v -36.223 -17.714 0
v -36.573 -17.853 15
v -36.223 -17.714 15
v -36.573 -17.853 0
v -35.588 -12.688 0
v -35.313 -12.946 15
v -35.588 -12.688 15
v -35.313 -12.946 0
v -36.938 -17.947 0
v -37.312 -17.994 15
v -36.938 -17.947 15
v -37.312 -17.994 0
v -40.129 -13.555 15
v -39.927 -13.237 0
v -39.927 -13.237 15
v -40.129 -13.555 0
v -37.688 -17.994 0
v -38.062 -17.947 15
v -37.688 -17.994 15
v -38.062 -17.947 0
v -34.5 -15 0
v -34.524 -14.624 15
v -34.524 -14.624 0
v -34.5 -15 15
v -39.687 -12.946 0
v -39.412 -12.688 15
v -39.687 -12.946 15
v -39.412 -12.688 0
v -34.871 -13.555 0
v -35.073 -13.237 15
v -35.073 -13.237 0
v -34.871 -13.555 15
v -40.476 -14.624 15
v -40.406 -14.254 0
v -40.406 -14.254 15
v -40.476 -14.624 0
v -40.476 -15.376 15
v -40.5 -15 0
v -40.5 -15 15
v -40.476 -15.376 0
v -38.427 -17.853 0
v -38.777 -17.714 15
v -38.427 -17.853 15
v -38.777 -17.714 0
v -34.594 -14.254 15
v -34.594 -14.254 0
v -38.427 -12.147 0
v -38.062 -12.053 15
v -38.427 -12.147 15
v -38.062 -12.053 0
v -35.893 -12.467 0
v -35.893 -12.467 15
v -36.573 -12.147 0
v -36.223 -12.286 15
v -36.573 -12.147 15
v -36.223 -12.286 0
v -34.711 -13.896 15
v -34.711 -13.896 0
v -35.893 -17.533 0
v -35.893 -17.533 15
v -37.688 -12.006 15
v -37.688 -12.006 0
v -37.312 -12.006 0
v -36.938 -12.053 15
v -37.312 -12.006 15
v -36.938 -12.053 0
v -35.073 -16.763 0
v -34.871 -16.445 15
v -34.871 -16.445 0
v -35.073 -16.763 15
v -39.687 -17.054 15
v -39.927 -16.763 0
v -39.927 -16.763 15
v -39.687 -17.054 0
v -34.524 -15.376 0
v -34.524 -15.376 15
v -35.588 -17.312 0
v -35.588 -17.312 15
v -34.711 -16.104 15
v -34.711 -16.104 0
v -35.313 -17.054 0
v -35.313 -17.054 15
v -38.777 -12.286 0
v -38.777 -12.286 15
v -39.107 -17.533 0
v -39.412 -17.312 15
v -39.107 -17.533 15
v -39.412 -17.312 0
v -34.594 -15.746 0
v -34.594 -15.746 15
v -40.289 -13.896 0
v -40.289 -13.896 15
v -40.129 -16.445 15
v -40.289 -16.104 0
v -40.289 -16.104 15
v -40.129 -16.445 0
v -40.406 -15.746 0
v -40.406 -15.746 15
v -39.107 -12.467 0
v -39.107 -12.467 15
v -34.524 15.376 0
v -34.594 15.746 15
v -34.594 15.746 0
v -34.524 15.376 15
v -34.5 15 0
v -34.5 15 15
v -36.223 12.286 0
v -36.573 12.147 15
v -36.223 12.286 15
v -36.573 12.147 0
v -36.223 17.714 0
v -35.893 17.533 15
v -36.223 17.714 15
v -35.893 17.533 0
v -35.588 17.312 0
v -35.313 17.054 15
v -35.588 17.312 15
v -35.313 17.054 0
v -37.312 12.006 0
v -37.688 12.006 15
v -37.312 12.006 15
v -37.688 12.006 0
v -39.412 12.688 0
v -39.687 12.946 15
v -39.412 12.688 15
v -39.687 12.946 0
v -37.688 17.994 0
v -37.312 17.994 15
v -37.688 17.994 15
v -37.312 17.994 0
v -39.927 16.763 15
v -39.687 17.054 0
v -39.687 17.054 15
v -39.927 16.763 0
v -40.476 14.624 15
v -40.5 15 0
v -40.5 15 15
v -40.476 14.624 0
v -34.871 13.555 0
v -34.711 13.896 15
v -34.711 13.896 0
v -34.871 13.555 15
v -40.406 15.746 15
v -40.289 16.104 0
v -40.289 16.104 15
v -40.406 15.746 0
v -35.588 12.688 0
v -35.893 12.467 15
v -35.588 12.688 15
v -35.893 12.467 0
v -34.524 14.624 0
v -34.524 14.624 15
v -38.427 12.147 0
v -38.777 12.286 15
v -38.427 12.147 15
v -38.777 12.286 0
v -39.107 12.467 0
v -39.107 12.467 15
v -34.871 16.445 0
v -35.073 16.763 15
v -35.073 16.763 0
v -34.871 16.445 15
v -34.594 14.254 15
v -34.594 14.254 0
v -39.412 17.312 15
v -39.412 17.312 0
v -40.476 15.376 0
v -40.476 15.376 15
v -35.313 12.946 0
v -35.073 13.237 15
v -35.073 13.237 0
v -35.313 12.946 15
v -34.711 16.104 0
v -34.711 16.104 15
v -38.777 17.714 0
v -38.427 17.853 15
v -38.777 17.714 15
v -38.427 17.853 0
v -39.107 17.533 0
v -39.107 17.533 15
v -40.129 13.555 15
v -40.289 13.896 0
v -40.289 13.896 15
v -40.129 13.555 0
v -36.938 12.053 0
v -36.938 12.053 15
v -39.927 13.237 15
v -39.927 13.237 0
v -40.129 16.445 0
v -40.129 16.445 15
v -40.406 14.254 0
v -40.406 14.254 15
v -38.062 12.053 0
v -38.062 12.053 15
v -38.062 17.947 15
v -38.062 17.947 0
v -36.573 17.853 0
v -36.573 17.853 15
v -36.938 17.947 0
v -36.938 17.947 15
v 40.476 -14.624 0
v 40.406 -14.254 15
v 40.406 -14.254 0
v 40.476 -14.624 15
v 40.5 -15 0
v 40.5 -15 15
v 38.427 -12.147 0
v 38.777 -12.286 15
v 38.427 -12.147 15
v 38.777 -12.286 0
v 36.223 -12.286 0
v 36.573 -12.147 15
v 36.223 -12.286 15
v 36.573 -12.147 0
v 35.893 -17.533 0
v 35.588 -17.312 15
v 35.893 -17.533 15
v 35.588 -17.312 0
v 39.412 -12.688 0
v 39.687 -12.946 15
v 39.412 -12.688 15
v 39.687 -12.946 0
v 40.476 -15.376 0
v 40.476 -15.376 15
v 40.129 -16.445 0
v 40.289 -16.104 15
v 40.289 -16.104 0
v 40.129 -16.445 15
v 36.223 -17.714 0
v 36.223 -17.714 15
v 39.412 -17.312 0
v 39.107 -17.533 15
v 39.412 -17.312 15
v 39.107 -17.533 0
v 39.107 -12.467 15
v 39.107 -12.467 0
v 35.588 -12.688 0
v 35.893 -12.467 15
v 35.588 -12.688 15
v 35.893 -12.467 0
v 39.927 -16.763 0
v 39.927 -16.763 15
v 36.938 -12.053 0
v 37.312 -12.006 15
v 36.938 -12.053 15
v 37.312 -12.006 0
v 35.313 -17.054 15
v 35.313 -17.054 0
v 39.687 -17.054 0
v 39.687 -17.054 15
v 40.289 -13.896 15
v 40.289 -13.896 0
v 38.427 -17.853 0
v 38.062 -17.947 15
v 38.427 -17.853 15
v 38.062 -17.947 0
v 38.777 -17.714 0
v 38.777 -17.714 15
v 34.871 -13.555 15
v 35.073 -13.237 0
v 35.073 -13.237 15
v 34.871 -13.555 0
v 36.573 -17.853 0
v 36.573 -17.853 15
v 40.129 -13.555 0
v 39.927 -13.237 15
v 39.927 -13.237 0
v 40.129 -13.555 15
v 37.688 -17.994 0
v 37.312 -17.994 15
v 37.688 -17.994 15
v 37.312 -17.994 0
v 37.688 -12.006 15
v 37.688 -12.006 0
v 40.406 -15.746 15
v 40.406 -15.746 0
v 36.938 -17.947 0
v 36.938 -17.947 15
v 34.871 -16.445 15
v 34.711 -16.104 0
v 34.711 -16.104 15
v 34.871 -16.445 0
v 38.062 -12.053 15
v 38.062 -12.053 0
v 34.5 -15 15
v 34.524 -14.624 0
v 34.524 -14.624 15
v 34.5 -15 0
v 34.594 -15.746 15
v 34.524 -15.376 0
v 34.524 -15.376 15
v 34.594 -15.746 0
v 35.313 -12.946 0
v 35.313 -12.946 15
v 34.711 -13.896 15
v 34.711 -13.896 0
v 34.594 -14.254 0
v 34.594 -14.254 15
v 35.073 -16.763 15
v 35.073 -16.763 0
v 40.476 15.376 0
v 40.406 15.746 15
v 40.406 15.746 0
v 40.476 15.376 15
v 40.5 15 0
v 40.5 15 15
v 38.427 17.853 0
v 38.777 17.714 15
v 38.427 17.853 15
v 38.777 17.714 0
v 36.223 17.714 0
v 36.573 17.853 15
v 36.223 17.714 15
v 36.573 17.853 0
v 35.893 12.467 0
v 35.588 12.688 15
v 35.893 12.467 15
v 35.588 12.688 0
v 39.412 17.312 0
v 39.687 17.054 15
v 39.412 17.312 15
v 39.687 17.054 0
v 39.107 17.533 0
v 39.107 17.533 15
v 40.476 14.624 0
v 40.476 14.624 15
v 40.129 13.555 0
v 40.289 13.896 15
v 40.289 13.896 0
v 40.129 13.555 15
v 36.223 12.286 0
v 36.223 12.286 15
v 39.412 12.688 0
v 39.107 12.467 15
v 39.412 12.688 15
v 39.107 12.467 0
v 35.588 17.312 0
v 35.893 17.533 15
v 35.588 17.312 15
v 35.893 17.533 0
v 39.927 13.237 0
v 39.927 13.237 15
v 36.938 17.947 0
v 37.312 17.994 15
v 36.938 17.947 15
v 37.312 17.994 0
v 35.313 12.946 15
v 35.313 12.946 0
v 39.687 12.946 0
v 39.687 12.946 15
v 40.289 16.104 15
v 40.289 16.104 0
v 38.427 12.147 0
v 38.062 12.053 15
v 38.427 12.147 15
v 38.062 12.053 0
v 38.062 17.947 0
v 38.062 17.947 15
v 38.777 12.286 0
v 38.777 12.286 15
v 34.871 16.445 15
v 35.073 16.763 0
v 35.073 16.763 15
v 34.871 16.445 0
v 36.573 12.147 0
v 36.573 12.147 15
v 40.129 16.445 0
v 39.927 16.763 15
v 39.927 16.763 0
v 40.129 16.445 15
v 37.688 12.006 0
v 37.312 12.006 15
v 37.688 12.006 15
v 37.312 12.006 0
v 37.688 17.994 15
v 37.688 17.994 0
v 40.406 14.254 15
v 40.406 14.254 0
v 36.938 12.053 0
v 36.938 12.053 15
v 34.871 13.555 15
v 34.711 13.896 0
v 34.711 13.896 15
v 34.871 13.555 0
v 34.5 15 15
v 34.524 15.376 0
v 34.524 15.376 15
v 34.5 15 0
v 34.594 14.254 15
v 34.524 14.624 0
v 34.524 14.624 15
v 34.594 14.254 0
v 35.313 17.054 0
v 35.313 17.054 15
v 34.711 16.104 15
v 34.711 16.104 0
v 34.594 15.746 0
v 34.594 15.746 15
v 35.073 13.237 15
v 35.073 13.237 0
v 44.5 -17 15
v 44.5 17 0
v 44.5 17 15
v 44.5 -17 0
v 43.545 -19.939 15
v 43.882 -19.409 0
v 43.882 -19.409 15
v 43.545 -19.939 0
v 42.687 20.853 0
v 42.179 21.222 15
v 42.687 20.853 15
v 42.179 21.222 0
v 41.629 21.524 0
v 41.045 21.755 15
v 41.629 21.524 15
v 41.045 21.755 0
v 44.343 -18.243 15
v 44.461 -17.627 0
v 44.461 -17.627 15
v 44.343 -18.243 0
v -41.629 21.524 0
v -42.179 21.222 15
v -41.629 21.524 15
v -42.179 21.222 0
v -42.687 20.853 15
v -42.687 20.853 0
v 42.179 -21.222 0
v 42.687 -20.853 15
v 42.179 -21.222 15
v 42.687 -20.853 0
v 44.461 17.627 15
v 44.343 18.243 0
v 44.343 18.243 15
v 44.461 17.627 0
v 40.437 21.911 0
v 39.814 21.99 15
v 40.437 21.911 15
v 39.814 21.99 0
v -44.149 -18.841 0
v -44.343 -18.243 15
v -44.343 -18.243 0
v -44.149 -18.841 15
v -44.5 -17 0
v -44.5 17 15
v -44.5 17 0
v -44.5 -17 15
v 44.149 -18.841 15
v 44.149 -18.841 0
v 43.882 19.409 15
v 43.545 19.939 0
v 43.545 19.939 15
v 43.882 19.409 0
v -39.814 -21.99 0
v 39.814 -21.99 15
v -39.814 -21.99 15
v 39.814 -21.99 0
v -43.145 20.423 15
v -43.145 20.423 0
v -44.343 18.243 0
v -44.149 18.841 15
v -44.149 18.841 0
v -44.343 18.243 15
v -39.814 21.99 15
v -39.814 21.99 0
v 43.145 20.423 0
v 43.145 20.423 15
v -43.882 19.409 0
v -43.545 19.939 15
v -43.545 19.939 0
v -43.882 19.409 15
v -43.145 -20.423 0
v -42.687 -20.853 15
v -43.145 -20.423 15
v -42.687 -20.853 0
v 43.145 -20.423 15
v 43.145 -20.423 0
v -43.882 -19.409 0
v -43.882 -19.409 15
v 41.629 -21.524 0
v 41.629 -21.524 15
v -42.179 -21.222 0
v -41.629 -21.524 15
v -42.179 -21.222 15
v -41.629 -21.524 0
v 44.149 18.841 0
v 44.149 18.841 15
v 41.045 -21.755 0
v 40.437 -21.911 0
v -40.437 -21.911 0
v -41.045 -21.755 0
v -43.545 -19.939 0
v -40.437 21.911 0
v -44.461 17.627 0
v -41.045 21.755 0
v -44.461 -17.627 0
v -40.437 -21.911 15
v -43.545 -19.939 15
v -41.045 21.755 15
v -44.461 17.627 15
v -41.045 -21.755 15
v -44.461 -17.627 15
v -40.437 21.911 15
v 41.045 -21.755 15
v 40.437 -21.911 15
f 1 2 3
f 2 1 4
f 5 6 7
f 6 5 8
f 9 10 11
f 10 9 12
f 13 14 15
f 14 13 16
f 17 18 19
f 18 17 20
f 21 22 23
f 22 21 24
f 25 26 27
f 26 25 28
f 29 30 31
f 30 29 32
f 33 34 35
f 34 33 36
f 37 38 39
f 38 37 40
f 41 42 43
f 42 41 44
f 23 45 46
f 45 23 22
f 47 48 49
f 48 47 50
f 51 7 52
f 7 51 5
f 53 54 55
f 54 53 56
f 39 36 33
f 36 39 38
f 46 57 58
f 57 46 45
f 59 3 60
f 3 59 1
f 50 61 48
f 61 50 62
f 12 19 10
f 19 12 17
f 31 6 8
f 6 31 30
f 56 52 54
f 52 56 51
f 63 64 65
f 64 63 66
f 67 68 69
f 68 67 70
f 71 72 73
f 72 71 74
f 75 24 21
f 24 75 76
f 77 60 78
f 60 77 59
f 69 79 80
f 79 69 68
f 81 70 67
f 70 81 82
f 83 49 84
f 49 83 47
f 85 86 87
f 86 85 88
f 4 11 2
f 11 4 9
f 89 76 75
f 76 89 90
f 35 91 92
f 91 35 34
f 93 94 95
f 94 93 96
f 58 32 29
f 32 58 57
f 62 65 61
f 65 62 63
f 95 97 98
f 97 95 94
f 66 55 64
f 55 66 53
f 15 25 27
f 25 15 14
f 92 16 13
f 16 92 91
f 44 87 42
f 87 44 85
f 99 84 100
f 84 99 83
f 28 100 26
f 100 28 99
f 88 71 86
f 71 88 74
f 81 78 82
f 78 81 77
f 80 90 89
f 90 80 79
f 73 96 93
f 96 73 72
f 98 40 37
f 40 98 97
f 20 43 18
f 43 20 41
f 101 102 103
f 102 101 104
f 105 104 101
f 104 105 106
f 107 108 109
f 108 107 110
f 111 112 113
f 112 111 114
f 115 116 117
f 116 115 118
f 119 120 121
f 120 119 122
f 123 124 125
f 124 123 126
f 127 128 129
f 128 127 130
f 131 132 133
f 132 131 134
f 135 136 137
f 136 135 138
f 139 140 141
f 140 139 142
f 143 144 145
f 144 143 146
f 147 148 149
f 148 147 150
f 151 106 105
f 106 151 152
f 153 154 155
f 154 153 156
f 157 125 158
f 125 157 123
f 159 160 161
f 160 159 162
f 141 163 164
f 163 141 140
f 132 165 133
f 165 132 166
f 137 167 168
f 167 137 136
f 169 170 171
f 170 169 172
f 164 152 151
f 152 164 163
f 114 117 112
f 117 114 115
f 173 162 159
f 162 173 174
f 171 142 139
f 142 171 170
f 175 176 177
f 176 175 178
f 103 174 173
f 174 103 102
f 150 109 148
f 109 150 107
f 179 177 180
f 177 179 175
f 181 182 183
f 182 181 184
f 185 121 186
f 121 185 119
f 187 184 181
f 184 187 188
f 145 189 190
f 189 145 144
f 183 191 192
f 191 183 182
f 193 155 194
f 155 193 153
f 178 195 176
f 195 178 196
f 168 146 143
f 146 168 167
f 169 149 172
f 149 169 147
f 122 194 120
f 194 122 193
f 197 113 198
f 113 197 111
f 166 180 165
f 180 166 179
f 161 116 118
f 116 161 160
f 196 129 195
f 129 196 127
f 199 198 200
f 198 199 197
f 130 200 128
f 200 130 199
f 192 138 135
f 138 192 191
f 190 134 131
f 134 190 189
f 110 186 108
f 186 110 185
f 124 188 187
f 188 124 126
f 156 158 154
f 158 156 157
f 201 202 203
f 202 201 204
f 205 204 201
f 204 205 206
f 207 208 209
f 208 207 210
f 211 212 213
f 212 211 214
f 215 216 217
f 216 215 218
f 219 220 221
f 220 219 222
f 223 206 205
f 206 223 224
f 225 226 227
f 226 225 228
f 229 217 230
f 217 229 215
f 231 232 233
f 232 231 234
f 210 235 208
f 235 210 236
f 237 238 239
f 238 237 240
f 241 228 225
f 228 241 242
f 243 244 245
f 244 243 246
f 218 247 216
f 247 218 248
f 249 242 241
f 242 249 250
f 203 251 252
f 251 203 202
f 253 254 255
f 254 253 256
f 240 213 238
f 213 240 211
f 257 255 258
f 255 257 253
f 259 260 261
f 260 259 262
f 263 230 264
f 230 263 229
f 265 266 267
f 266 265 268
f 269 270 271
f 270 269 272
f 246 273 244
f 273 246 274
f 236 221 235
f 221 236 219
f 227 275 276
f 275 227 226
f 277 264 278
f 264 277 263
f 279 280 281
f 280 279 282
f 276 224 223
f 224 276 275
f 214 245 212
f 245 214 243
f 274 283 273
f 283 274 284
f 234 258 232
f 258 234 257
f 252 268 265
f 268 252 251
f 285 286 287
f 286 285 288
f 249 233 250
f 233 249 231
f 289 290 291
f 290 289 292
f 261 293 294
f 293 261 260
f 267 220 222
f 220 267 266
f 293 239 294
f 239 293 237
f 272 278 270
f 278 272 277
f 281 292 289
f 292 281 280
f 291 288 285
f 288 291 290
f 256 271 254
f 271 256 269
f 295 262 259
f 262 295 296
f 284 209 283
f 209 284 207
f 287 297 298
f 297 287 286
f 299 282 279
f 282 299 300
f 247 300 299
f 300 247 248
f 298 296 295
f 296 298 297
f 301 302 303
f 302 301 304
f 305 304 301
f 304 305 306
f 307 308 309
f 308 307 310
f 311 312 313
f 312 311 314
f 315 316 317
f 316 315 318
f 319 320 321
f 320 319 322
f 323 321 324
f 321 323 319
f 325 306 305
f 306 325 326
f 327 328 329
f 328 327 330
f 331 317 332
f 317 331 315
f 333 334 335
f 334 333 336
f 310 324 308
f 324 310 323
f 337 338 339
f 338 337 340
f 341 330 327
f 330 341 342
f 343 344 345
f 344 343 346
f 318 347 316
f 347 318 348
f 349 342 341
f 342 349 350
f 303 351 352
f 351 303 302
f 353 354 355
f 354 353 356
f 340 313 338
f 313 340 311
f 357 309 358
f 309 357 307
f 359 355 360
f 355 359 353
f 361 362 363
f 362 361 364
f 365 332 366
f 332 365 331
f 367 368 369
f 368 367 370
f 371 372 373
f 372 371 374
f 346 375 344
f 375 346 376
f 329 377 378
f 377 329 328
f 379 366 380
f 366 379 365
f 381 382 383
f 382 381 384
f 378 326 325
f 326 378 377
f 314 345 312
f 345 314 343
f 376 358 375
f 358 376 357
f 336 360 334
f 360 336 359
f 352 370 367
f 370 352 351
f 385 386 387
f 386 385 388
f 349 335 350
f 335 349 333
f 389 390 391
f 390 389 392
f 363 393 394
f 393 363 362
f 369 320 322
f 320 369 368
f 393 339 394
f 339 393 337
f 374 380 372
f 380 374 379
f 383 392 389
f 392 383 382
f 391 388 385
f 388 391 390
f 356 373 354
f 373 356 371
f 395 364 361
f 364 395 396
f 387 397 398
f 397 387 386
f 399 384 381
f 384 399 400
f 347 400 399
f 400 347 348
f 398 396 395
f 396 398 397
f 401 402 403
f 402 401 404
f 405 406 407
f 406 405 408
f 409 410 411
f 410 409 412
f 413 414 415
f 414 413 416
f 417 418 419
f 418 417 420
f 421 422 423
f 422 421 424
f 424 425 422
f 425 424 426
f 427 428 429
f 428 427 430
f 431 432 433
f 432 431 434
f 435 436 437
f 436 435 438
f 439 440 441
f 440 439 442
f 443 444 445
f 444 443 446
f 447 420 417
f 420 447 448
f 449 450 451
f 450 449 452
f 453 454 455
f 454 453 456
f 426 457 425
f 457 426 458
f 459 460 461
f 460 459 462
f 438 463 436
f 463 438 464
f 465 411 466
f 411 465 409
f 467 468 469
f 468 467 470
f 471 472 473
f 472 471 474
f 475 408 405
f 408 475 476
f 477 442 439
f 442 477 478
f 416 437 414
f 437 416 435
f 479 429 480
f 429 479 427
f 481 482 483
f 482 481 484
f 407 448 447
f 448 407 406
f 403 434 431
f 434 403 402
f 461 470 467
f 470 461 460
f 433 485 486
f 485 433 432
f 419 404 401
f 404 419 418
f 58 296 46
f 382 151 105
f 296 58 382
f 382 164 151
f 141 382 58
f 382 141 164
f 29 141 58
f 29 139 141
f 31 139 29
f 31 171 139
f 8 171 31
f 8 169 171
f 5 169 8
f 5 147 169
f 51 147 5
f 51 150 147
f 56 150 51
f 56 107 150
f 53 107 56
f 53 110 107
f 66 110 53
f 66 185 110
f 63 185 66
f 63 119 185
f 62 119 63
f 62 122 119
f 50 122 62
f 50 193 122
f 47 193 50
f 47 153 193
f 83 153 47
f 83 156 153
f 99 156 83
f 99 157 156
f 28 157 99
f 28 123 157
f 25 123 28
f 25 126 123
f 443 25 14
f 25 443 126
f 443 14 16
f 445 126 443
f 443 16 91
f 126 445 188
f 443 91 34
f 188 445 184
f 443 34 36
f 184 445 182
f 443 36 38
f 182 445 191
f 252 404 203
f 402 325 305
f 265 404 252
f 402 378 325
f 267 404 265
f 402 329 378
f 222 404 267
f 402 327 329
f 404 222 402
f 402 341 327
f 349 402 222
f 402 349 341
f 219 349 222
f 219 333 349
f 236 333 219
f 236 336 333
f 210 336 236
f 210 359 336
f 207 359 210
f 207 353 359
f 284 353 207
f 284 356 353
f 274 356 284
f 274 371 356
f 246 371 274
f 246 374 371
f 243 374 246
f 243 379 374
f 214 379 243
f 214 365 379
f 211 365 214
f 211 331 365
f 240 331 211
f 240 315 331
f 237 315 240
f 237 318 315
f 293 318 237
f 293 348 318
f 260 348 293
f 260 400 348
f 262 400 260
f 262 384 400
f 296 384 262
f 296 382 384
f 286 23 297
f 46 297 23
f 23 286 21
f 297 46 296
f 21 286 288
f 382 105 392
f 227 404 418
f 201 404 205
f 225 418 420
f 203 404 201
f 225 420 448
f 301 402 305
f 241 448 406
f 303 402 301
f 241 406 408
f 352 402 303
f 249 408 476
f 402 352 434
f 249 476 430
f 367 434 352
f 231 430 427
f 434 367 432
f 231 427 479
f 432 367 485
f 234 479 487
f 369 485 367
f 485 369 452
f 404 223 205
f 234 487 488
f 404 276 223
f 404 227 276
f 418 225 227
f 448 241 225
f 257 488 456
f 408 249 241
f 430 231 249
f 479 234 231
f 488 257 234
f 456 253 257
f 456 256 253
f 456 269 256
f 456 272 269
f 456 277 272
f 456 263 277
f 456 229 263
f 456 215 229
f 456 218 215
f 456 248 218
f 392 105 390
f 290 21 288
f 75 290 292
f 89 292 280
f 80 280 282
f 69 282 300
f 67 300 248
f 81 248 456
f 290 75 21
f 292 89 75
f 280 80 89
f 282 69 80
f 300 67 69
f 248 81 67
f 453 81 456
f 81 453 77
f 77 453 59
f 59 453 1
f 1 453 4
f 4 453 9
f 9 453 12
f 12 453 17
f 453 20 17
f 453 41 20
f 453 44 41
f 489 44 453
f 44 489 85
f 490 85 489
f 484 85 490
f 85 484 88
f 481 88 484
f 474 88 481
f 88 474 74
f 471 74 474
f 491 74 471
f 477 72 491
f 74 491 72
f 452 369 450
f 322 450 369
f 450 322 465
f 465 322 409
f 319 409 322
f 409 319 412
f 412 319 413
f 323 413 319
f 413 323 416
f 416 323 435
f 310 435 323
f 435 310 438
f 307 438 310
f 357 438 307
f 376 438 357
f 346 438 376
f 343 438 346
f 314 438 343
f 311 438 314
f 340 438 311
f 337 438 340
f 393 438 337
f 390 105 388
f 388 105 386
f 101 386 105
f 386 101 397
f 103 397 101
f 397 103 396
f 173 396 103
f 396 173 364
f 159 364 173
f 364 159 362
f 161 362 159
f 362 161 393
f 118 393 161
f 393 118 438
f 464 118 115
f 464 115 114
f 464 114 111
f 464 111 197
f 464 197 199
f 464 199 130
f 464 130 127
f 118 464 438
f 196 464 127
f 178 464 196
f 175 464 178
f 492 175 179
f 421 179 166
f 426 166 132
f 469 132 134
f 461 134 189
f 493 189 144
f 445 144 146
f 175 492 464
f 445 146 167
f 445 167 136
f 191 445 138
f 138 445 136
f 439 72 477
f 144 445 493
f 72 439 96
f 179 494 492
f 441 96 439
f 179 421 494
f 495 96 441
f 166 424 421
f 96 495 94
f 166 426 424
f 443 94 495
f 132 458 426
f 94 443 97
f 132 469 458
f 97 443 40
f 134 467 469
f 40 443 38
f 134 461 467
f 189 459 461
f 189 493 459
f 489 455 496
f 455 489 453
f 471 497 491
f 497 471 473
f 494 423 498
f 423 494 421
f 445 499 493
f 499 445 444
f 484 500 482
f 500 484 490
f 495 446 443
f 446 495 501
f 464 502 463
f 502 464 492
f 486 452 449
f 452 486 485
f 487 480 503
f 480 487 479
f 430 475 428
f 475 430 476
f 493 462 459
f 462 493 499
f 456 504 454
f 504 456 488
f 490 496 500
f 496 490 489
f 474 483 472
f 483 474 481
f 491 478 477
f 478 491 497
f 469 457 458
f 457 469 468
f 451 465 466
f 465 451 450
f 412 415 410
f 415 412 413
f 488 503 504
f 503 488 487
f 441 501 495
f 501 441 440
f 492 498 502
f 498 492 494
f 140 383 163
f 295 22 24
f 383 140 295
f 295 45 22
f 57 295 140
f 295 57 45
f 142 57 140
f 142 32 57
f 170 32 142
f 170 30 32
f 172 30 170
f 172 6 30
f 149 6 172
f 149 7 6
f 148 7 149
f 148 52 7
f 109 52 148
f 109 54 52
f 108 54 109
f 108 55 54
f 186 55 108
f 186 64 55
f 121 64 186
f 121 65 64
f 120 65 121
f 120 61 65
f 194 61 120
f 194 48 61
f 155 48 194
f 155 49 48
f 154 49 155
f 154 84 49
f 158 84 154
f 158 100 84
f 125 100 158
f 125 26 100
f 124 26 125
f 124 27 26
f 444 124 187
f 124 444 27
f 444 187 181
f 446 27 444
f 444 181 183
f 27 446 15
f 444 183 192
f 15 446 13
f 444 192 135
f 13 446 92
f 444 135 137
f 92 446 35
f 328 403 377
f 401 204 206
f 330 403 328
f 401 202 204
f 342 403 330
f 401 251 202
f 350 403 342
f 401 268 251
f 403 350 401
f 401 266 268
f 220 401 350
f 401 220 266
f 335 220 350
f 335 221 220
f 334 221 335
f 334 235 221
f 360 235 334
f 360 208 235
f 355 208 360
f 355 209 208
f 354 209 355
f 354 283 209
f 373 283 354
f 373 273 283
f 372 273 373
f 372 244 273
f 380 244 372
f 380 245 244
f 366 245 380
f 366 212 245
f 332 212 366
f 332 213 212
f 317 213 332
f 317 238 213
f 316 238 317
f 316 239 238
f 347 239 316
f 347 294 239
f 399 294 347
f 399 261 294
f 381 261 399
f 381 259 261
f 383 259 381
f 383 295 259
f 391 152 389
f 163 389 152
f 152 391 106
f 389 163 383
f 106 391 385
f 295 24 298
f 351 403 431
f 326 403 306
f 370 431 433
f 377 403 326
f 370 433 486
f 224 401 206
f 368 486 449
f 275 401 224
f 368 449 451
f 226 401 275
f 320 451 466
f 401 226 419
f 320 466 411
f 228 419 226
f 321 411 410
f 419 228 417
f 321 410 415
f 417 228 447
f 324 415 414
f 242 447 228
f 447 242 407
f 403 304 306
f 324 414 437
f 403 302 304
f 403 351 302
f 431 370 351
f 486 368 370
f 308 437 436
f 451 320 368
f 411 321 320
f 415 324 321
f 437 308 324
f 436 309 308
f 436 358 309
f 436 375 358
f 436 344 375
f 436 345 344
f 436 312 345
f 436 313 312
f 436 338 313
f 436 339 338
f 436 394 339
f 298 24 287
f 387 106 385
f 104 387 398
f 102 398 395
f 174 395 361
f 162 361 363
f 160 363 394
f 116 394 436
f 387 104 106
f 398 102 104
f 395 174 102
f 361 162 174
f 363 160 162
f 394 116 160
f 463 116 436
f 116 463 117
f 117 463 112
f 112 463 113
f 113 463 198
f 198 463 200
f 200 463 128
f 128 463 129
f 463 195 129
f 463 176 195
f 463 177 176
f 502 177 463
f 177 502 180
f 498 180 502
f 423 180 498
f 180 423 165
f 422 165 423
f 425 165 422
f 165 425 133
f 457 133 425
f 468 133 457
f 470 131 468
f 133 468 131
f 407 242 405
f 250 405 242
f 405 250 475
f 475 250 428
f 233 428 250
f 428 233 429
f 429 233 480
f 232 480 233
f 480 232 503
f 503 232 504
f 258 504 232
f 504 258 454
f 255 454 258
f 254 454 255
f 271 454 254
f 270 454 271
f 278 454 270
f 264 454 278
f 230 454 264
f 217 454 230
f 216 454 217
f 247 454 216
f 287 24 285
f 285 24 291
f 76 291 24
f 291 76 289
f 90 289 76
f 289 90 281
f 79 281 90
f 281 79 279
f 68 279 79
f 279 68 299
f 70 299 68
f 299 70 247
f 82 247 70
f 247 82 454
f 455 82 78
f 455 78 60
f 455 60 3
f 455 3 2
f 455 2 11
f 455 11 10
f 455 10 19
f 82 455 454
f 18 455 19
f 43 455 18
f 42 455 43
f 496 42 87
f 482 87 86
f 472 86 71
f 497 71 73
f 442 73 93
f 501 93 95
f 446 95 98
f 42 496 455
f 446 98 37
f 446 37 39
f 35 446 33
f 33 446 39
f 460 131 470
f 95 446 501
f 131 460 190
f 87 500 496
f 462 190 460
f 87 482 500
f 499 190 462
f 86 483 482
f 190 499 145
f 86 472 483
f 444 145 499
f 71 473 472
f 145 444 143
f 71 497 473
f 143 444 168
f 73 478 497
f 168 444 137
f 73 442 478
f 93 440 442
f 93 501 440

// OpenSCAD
$fn = 50;


difference() {
	union() {
		hull() {
			translate(v = [-39.5000000000, 17.0000000000, 0]) {
				cylinder(h = 15, r = 5);
			}
			translate(v = [39.5000000000, 17.0000000000, 0]) {
				cylinder(h = 15, r = 5);
			}
			translate(v = [-39.5000000000, -17.0000000000, 0]) {
				cylinder(h = 15, r = 5);
			}
			translate(v = [39.5000000000, -17.0000000000, 0]) {
				cylinder(h = 15, r = 5);
			}
		}
	}
	union() {
		translate(v = [-37.5000000000, -15.0000000000, -100.0000000000]) {
			cylinder(h = 200, r = 3.0000000000);
		}
		translate(v = [-37.5000000000, 15.0000000000, -100.0000000000]) {
			cylinder(h = 200, r = 3.0000000000);
		}
		translate(v = [37.5000000000, -15.0000000000, -100.0000000000]) {
			cylinder(h = 200, r = 3.0000000000);
		}
		translate(v = [37.5000000000, 15.0000000000, -100.0000000000]) {
			cylinder(h = 200, r = 3.0000000000);
		}
	}
}
